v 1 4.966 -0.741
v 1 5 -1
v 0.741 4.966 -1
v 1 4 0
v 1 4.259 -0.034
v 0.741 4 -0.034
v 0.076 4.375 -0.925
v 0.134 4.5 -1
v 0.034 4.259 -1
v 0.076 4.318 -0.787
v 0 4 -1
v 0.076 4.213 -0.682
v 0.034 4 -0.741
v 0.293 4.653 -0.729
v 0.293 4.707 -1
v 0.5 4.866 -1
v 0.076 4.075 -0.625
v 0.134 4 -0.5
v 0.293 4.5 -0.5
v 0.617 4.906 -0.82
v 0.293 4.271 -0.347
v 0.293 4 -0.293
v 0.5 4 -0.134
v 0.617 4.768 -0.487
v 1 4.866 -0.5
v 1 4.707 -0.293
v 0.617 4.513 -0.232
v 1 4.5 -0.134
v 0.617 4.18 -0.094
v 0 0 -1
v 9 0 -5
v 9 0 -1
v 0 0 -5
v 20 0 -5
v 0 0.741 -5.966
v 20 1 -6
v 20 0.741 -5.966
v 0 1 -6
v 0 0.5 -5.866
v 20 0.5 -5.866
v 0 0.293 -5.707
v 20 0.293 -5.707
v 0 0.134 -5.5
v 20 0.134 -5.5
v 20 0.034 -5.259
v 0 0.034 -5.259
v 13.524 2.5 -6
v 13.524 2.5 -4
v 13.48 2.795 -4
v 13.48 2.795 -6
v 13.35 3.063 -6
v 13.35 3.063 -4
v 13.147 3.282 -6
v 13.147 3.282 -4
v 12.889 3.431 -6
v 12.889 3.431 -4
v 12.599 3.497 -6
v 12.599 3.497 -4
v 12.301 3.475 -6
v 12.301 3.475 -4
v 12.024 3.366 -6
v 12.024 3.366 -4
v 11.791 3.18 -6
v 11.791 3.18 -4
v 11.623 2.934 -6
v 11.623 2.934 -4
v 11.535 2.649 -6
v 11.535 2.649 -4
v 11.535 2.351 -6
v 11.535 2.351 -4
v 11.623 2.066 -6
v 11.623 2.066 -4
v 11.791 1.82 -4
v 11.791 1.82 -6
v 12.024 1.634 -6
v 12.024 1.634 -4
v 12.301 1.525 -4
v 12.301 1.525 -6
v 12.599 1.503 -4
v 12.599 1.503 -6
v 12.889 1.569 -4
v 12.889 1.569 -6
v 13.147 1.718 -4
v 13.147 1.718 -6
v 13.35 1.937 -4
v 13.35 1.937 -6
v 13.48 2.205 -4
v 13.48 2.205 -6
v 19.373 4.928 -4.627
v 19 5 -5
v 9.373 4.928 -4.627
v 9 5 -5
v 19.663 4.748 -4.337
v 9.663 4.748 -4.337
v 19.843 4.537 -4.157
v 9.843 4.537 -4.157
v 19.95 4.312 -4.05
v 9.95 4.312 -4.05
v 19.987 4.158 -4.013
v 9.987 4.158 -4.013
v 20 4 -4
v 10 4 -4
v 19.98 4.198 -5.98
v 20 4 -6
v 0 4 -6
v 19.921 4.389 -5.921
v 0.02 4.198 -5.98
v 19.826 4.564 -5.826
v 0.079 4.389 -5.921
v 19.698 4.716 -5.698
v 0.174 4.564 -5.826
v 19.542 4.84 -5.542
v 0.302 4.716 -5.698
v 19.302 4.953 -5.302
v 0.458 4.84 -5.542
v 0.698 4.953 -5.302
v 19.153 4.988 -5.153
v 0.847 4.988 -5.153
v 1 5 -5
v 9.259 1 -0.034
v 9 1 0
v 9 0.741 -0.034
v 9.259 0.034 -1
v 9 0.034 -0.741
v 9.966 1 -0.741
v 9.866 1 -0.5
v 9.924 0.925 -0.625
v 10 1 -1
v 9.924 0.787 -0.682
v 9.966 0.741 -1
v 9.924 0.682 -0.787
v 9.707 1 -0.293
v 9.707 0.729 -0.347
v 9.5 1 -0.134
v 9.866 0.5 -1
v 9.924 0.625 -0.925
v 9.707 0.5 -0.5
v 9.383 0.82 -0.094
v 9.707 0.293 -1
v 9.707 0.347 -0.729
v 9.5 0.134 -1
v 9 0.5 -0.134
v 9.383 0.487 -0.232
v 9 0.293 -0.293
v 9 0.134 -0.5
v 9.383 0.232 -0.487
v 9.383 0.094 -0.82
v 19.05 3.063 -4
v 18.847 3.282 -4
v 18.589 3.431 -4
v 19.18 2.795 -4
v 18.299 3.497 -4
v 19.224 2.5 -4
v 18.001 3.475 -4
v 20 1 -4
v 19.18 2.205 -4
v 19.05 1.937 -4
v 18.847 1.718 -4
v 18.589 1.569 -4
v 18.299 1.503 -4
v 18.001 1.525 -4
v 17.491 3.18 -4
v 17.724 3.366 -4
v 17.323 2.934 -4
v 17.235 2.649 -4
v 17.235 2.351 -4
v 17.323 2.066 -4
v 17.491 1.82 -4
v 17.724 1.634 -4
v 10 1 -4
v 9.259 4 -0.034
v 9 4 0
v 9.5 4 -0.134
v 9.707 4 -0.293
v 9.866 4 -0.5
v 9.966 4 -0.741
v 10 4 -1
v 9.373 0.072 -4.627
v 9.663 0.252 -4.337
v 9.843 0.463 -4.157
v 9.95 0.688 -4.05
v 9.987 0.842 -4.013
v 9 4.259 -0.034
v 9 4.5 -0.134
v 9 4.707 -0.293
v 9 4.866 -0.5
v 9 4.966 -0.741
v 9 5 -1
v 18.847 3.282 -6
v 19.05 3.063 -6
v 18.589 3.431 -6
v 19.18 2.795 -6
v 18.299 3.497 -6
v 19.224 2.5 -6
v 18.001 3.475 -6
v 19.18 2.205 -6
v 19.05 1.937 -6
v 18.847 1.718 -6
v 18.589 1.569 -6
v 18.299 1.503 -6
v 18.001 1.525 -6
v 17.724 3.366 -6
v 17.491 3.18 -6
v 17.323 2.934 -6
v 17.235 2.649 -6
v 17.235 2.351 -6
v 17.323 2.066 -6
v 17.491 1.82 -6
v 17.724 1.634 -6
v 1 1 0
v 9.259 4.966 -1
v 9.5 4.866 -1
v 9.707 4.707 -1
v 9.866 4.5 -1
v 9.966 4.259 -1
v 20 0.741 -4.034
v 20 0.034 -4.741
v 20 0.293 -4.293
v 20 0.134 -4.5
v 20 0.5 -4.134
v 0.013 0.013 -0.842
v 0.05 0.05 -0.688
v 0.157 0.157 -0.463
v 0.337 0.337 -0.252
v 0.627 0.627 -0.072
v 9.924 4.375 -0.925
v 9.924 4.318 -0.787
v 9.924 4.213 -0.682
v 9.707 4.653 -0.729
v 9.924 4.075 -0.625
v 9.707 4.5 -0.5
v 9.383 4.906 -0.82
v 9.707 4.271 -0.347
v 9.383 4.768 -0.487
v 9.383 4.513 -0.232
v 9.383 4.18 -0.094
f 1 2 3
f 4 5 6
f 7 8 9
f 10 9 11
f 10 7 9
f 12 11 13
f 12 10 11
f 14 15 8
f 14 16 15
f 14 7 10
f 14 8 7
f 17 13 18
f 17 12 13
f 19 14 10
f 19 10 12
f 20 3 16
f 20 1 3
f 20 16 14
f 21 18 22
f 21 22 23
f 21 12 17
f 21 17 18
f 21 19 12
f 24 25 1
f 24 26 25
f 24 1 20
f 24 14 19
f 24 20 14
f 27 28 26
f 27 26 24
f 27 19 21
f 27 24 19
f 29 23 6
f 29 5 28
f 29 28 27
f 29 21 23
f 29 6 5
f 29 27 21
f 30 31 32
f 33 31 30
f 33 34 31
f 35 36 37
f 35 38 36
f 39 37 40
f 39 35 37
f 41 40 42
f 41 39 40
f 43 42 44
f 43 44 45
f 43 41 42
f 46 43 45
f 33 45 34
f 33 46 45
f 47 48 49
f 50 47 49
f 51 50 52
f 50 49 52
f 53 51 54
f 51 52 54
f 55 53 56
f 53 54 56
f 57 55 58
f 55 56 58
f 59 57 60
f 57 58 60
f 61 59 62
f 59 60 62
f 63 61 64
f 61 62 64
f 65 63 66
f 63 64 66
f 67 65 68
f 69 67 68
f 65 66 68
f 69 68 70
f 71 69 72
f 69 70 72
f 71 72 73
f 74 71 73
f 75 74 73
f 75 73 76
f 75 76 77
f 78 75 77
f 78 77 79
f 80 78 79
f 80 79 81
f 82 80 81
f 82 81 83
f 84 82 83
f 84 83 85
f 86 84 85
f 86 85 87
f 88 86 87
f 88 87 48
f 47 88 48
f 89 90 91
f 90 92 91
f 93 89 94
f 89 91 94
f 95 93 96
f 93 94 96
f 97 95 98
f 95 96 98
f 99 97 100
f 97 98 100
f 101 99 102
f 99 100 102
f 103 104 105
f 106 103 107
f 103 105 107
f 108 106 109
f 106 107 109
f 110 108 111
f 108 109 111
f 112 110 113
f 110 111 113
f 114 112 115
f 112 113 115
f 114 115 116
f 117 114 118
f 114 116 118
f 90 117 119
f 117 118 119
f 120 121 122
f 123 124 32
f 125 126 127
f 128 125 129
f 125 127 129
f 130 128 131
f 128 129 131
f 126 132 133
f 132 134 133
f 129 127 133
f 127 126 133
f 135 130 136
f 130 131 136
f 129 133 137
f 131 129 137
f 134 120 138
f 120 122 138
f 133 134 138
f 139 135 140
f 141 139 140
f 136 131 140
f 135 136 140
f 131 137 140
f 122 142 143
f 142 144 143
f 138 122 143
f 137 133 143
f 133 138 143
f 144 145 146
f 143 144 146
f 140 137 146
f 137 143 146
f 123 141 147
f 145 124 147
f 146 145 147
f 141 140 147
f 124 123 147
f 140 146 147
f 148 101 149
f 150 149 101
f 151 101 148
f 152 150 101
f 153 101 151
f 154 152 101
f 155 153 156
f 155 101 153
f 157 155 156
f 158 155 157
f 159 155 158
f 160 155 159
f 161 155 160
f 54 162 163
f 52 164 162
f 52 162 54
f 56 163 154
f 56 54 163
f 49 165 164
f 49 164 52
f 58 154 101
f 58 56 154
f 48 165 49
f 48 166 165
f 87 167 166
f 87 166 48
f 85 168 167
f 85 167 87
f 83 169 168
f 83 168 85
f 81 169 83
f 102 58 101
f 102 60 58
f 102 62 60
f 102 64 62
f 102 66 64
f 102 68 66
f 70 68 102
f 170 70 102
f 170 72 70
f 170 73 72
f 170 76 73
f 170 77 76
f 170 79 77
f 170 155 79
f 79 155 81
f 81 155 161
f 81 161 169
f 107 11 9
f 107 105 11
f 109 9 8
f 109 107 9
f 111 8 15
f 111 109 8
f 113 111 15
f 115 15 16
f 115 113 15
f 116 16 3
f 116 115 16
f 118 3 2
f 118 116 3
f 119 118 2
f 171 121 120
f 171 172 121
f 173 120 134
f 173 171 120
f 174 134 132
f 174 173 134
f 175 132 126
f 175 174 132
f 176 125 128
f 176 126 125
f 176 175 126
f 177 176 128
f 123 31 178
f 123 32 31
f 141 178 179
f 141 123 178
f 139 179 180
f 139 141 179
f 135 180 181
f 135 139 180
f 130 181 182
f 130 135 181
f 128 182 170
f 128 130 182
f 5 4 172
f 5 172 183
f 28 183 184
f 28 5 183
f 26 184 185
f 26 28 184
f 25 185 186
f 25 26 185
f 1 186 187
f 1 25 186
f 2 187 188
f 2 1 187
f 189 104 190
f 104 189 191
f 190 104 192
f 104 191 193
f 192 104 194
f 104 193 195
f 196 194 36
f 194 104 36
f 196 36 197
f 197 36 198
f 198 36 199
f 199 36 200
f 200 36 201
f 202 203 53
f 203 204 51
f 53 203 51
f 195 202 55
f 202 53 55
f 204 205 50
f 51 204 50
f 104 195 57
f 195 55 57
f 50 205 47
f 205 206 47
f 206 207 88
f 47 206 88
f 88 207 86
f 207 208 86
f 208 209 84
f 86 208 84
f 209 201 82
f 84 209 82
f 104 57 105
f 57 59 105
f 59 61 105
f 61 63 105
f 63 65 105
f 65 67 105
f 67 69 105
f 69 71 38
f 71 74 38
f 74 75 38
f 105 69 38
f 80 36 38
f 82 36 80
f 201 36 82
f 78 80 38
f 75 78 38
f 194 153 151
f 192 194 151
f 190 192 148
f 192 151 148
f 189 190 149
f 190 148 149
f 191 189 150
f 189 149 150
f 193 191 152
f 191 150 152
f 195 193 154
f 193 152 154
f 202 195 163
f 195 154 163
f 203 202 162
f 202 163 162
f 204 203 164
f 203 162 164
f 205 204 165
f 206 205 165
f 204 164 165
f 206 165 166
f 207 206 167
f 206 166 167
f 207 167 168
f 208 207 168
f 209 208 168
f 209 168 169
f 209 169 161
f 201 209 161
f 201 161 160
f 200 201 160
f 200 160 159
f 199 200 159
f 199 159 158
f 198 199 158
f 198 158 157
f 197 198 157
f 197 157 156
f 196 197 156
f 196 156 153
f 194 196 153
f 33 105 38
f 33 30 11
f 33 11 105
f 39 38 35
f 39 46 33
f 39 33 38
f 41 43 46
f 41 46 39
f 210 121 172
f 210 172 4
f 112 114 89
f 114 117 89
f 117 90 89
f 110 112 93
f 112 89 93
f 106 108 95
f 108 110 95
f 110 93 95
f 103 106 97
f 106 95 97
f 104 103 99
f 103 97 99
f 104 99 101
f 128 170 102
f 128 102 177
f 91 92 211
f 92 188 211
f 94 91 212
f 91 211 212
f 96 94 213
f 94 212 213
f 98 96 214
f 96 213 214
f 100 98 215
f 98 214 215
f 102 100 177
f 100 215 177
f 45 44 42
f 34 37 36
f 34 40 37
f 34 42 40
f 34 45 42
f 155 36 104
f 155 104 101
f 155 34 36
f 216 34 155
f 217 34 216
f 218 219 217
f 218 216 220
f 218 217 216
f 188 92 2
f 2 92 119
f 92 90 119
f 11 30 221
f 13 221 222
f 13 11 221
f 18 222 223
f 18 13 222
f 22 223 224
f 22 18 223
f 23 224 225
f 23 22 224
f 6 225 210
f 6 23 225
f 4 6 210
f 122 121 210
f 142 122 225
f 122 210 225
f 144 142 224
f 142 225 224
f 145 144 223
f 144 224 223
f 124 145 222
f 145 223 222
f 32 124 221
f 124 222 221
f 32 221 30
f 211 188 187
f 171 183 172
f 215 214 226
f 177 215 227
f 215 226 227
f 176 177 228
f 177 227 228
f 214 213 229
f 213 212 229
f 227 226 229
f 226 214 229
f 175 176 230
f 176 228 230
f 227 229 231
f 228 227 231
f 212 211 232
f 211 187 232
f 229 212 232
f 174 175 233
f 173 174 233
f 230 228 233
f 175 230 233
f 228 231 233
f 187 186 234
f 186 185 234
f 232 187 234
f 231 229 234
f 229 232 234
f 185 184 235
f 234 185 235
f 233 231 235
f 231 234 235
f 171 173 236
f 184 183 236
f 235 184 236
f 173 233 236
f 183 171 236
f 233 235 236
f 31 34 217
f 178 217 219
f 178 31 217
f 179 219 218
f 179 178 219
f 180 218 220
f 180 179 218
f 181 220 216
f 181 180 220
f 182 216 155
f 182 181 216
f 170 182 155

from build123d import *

# Parameters (mm, degrees)
BOSS_EXTRUDE1_DEPTH = 5
SKETCH2_R           = 1
CUT_EXTRUDE1_DEPTH  = 5
FILLET1_R           = 1


with BuildPart() as part:
    # Sketch1 → Boss-Extrude1 (new body)
    with BuildSketch(Plane(origin=(0, 0, 0), x_dir=(1, 0, 0), z_dir=(0, 1, 0))):
        Polygon((0, 0), (0, 6), (16.608456475, 6), (20, 6), (20, 4), (10, 4), (10, 0), align=None)
    extrude(amount=BOSS_EXTRUDE1_DEPTH)

    # Sketch2 → Cut-Extrude1 (cut)
    with BuildSketch(Plane.XY.offset(-4)):
        with Locations((12.523987241, 2.5)):
            Circle(SKETCH2_R)
        with Locations((18.223987241, 2.5)):
            Circle(SKETCH2_R)
    extrude(amount=-CUT_EXTRUDE1_DEPTH, mode=Mode.SUBTRACT)

    # Fillet1
    fillet1_edges = [part.edges().sort_by_distance(p)[0] for p in [
        (5, 0, 0),
        (5, 5, 0),
        (0, 5, -3),
        (10, 5, -6),
        (20, 5, -5),
        (15, 5, -4),
        (10, 5, -2),
        (0, 2.5, 0),
        (10, 2.5, 0),
        (10, 0, -2),
        (10, 0, -6),
        (15, 0, -4),
    ]]
    fillet(fillet1_edges, radius=FILLET1_R - 0.0001)  # a hair under: the kernel refuses the full size


solid = part.part
